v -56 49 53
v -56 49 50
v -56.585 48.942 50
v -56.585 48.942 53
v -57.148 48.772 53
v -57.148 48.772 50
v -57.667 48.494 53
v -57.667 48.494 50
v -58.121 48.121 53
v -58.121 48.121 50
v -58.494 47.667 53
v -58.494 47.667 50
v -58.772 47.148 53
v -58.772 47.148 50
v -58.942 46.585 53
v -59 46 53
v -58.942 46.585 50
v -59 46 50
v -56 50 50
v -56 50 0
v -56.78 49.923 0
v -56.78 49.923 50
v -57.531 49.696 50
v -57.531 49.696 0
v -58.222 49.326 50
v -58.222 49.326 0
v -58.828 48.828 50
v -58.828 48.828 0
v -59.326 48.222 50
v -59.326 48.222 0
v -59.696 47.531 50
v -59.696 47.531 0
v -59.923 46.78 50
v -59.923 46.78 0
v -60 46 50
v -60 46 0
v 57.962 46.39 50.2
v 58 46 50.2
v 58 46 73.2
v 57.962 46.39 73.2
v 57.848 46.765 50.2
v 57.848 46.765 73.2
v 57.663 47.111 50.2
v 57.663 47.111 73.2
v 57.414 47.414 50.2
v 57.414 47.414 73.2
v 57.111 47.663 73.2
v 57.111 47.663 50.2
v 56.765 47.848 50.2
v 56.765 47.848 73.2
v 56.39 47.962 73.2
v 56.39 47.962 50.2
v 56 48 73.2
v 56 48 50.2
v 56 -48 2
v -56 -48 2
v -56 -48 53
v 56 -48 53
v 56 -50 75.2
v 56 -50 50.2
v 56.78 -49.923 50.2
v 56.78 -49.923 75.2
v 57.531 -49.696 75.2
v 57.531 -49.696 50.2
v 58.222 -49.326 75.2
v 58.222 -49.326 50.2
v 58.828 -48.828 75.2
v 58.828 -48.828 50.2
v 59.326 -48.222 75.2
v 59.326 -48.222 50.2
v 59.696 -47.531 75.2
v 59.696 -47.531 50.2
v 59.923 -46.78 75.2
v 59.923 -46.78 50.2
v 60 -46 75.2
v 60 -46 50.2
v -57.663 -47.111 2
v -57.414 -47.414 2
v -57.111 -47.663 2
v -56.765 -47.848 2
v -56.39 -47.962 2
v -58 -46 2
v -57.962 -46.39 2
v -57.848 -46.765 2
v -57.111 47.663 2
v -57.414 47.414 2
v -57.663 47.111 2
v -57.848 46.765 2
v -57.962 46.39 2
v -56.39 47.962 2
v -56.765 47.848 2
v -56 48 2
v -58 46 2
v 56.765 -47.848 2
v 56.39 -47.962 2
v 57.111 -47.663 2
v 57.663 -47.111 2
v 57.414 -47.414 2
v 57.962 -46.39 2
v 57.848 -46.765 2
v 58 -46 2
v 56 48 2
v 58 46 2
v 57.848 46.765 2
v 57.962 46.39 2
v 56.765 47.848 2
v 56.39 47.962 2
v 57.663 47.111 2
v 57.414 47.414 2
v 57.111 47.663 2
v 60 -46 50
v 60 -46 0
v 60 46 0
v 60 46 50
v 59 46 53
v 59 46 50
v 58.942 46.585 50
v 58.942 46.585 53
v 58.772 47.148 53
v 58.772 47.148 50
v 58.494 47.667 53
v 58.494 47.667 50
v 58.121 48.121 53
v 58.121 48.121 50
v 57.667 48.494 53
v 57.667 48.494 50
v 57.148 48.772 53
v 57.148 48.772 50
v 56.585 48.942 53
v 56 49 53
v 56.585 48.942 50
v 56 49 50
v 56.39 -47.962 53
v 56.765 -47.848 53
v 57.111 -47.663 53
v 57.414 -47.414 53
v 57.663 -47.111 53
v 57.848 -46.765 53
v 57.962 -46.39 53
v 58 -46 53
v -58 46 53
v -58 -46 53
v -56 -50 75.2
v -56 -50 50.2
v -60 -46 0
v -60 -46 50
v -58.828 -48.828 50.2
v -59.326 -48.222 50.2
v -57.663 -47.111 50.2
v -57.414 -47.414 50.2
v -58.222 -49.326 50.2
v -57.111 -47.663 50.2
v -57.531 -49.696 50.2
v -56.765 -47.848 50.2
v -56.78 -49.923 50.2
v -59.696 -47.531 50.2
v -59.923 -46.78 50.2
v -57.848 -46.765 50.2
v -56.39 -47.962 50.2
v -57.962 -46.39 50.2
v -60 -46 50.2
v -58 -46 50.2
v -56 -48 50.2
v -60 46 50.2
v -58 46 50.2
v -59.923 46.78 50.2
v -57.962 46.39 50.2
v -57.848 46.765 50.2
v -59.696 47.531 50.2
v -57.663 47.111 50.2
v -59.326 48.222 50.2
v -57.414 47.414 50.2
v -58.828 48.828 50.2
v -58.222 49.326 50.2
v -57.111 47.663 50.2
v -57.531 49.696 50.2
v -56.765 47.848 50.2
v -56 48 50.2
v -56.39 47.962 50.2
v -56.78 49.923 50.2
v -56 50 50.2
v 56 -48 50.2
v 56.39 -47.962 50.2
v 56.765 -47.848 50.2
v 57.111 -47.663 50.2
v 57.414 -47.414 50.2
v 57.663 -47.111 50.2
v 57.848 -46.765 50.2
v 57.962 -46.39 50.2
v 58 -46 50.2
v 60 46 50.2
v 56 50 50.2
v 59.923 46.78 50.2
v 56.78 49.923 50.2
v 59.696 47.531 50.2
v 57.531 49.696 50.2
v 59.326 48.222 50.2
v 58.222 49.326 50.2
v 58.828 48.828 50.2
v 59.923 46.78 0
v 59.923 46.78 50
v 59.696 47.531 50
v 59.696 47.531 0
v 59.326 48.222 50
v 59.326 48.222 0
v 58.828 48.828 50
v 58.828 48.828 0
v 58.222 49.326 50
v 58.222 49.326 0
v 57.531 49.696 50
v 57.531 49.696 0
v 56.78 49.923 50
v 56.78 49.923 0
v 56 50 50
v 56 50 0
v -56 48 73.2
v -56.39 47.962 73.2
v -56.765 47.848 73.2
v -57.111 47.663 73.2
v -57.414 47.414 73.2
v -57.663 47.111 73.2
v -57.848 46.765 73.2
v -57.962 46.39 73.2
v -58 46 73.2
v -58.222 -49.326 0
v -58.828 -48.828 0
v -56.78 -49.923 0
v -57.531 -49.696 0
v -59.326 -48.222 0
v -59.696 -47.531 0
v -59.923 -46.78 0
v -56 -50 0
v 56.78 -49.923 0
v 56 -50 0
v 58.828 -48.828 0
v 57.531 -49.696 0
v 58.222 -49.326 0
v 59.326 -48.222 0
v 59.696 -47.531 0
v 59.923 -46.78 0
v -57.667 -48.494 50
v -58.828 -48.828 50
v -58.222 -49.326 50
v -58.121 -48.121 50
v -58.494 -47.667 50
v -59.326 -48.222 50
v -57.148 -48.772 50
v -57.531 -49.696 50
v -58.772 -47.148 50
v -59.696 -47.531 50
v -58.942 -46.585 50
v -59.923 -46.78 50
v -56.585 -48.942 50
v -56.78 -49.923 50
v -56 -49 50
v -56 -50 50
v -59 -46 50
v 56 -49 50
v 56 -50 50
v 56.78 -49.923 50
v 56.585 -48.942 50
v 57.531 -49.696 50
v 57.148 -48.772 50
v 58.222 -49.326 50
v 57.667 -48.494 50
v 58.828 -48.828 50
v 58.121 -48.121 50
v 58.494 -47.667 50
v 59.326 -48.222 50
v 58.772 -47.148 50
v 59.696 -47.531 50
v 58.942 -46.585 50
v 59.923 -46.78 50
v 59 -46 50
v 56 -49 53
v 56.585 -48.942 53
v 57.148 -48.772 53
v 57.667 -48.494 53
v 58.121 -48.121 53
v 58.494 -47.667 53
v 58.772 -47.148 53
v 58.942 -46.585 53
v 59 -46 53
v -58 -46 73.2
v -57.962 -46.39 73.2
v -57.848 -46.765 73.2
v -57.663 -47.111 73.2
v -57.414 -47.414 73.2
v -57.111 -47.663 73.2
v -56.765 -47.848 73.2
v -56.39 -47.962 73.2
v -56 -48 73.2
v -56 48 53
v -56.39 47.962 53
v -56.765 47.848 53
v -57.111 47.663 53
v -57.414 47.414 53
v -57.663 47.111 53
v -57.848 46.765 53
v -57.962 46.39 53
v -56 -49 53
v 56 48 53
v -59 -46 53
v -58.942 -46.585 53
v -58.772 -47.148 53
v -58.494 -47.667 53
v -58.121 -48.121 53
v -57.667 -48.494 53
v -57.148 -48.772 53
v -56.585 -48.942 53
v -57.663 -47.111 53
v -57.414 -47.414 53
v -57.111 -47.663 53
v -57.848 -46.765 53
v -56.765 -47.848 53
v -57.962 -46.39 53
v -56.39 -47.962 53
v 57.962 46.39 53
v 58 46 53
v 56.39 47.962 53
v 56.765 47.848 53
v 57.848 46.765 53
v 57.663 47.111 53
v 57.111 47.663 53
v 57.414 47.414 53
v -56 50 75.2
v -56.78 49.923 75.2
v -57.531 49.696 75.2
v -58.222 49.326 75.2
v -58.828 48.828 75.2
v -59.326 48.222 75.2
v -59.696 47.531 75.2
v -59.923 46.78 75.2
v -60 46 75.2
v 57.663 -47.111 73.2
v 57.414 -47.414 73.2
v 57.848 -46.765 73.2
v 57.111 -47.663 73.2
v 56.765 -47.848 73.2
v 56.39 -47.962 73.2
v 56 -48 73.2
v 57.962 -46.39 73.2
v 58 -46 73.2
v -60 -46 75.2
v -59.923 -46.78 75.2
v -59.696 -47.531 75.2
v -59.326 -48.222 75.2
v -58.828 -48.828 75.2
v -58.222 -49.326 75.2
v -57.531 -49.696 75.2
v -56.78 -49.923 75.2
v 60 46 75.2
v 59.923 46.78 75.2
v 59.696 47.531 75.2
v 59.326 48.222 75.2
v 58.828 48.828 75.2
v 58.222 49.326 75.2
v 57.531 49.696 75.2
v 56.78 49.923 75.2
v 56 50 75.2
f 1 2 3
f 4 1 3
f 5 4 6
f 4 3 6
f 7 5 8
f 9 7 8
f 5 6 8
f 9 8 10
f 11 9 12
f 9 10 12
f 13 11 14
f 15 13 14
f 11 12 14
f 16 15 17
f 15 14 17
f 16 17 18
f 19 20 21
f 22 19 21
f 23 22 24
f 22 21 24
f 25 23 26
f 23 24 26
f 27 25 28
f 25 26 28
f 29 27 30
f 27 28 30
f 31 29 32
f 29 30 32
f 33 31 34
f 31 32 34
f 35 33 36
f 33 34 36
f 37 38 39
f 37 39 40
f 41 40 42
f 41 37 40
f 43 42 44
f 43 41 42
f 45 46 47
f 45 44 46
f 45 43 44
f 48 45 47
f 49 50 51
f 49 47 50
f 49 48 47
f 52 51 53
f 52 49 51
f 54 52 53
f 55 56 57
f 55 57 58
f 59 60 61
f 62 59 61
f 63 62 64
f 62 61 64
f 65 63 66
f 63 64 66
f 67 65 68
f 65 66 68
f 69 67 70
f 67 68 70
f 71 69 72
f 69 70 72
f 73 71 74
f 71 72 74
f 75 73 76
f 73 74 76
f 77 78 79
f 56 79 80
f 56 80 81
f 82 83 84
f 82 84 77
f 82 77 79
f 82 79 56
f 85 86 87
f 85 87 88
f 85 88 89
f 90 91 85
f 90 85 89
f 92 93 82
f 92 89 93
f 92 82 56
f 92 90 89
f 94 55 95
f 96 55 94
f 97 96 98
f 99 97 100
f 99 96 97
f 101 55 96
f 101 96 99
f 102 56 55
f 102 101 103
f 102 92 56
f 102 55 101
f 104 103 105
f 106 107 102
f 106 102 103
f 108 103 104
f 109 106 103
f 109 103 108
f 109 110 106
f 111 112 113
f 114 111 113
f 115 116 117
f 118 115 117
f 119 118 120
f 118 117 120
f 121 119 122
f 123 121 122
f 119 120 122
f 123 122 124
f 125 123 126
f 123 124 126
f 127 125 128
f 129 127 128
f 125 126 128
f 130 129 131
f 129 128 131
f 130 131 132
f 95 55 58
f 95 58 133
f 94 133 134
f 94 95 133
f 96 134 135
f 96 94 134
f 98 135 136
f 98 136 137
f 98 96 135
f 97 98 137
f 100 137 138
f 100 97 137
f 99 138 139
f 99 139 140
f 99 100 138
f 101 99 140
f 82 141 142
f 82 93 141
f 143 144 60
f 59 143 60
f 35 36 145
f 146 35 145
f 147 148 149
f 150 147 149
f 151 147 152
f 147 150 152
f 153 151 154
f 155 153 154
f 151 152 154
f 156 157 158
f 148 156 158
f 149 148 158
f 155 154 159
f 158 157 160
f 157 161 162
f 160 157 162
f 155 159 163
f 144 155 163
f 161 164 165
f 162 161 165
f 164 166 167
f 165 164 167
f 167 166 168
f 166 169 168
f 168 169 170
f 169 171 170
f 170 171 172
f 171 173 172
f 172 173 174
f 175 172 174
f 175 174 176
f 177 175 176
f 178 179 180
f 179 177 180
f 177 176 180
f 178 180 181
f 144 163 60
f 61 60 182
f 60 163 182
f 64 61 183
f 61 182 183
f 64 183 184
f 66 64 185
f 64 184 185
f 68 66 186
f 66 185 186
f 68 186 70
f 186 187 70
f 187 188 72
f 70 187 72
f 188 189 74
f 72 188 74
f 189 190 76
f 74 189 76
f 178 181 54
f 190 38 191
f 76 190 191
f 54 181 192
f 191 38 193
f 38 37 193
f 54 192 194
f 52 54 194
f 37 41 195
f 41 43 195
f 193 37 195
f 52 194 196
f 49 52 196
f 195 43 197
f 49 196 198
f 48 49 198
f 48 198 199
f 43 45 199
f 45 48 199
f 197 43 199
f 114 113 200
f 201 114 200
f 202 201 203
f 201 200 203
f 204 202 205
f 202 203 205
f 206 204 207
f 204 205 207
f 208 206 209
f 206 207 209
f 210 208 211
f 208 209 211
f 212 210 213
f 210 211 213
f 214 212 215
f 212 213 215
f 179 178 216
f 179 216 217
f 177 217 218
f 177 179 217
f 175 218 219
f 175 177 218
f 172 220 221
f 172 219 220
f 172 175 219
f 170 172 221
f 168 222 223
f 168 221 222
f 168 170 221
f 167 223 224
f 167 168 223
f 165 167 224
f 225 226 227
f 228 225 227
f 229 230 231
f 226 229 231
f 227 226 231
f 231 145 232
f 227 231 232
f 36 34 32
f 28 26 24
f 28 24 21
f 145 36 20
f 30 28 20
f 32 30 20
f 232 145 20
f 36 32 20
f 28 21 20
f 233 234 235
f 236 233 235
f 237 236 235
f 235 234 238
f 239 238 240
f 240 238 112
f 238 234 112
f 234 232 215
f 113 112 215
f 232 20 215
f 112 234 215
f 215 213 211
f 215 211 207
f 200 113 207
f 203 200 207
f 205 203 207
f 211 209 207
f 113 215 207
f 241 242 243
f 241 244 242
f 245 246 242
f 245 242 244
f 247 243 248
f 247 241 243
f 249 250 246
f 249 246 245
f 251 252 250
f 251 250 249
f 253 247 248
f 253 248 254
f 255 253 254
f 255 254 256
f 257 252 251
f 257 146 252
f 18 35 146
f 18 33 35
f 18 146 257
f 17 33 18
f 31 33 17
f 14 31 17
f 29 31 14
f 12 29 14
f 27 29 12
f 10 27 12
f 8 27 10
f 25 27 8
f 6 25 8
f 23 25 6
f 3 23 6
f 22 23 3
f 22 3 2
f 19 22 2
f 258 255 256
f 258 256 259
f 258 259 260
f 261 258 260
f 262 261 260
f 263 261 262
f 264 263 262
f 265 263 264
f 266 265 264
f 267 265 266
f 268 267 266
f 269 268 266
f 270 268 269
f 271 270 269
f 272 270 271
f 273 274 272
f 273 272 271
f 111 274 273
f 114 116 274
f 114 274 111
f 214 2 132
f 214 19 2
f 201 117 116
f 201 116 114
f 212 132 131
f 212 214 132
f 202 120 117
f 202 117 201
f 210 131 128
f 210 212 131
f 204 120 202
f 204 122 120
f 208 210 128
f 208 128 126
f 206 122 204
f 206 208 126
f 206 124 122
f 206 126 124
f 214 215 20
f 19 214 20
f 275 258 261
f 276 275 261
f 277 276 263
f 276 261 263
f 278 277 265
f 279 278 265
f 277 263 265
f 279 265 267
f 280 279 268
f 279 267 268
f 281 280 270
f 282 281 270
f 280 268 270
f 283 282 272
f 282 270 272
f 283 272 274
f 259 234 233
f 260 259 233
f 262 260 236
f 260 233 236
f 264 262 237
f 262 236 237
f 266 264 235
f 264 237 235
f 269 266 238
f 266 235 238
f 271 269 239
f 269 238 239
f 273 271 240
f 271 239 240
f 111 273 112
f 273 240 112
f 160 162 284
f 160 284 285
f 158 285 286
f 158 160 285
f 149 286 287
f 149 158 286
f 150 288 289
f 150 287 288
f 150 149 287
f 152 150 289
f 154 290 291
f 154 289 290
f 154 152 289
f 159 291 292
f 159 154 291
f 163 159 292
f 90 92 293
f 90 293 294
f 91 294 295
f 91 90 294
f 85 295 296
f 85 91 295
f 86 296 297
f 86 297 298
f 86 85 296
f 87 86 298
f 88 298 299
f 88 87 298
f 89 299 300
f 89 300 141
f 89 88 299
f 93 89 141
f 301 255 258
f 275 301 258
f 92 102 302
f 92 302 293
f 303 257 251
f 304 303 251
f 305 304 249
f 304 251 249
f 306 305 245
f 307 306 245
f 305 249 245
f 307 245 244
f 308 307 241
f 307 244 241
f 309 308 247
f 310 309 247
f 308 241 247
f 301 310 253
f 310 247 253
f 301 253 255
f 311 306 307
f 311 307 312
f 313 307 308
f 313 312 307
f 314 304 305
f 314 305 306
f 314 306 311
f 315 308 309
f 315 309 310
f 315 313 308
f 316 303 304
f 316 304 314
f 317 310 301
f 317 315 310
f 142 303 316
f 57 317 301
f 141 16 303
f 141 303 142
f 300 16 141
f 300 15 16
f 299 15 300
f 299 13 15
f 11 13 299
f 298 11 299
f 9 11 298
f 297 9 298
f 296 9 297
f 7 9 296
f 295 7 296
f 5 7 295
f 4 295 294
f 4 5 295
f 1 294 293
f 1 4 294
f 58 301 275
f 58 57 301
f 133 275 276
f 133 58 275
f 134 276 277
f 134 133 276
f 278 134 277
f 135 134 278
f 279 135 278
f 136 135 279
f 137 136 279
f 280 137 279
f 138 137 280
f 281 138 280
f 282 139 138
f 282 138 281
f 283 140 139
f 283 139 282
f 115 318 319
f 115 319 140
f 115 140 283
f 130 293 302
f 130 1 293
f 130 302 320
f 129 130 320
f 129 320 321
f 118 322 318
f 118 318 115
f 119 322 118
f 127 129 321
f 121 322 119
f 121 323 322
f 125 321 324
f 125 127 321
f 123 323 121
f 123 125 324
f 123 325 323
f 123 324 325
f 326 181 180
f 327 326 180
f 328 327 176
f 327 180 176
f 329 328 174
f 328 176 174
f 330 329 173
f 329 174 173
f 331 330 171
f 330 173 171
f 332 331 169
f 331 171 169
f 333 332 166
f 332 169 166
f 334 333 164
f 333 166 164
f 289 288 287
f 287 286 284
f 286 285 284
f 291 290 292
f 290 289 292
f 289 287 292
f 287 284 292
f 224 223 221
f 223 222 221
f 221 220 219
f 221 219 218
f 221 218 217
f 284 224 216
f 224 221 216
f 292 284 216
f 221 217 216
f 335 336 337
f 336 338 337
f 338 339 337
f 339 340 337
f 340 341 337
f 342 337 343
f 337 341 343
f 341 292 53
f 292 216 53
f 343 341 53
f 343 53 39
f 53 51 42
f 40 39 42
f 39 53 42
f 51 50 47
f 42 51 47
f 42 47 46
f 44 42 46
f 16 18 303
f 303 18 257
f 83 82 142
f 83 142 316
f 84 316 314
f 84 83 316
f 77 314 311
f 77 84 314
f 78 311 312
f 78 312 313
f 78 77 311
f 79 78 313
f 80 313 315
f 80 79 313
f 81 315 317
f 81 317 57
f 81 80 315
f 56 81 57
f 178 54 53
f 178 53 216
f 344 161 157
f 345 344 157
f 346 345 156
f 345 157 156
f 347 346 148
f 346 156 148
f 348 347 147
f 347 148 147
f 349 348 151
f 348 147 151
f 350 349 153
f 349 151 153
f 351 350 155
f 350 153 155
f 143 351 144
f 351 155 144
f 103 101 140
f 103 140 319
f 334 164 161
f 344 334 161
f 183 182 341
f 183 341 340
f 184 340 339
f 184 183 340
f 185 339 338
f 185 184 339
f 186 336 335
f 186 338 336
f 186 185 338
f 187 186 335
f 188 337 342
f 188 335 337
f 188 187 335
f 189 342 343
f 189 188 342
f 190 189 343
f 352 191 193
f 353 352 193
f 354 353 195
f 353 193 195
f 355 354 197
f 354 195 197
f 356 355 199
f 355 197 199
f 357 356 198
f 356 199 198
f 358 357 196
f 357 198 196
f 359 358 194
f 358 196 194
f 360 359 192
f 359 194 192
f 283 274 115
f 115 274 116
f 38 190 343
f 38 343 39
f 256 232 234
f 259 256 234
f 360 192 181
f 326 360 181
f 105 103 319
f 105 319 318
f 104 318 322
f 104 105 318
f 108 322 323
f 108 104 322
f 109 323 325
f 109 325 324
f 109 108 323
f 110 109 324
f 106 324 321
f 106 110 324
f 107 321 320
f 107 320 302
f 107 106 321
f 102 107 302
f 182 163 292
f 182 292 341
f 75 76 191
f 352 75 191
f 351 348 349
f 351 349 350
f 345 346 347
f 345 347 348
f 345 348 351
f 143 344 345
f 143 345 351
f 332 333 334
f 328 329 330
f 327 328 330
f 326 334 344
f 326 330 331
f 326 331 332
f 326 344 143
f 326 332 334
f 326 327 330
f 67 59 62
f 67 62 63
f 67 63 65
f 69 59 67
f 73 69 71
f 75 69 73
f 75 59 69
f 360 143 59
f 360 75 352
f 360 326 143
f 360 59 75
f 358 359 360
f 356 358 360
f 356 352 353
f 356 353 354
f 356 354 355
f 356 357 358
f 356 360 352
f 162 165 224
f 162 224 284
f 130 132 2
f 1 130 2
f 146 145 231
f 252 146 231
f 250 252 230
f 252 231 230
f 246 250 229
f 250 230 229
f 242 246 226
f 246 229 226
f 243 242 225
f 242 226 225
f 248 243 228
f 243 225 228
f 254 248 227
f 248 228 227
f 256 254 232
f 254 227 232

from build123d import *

# Parameters (mm, degrees)
PAD_DEPTH       = 50
PAD001_DEPTH    = 3
POCKET_DEPTH    = 48
PAD002_DEPTH    = 25
THICKNESS_T     = -2
POCKET001_DEPTH = 3


with BuildPart() as base:
    # Sketch → Pad (new body)
    with BuildSketch(Plane.XY):
        with BuildLine():
            Line((-60, 46), (-60, -46))
            ThreePointArc((-60, -46), (-58.828427, -48.828427), (-56, -50))
            Line((-56, -50), (56, -50))
            ThreePointArc((56, -50), (58.828427, -48.828427), (60, -46))
            Line((60, -46), (60, 46))
            ThreePointArc((60, 46), (58.828427, 48.828427), (56, 50))
            Line((56, 50), (-56, 50))
            ThreePointArc((-56, 50), (-58.828427, 48.828427), (-60, 46))
        make_face()
    extrude(amount=PAD_DEPTH)

    # Sketch001 → Pad001 (join)
    with BuildSketch(Plane.XY.offset(50)):
        with BuildLine():
            Line((-59, 46), (-59, -46))
            ThreePointArc((-59, -46), (-58.12132, -48.12132), (-56, -49))
            Line((-56, -49), (56, -49))
            ThreePointArc((56, -49), (58.12132, -48.12132), (59, -46))
            Line((59, -46), (59, 46))
            ThreePointArc((59, 46), (58.12132, 48.12132), (56, 49))
            Line((56, 49), (-56, 49))
            ThreePointArc((-56, 49), (-58.12132, 48.12132), (-59, 46))
        make_face()
        with BuildLine():
            Line((-58, 46), (-58, -46))
            ThreePointArc((-58, -46), (-57.414214, -47.414214), (-56, -48))
            Line((-56, -48), (56, -48))
            ThreePointArc((56, -48), (57.414214, -47.414214), (58, -46))
            Line((58, -46), (58, 46))
            ThreePointArc((58, 46), (57.414214, 47.414214), (56, 48))
            Line((56, 48), (-56, 48))
            ThreePointArc((-56, 48), (-57.414214, 47.414214), (-58, 46))
        make_face(mode=Mode.SUBTRACT)
    extrude(amount=PAD001_DEPTH)

    # Sketch003 (on Face28 of Pad001) → Pocket (cut)
    with BuildSketch(Plane.XY.offset(50)):
        with BuildLine():
            Line((-58, 46), (-58, -46))
            ThreePointArc((-58, -46), (-57.414214, -47.414214), (-56, -48))
            Line((-56, -48), (56, -48))
            ThreePointArc((56, -48), (57.414214, -47.414214), (58, -46))
            Line((58, -46), (58, 46))
            ThreePointArc((58, 46), (57.414214, 47.414214), (56, 48))
            Line((56, 48), (-56, 48))
            ThreePointArc((-56, 48), (-57.414214, 47.414214), (-58, 46))
        make_face()
    extrude(amount=-POCKET_DEPTH, mode=Mode.SUBTRACT)


with BuildPart() as lid:
    # Sketch004 → Pad002 (new body)
    with BuildSketch(Plane.XY.offset(50.2)):
        with BuildLine():
            Line((-60, 46), (-60, -46))
            ThreePointArc((-60, -46), (-58.828427, -48.828427), (-56, -50))
            Line((-56, -50), (56, -50))
            ThreePointArc((56, -50), (58.828427, -48.828427), (60, -46))
            Line((60, -46), (60, 46))
            ThreePointArc((60, 46), (58.828427, 48.828427), (56, 50))
            Line((56, 50), (-56, 50))
            ThreePointArc((-56, 50), (-58.828427, 48.828427), (-60, 46))
        make_face()
    extrude(amount=PAD002_DEPTH)

    # Thickness
    thickness_openings = [lid.faces().sort_by_distance(p)[0] for p in [
        (0, 0, 50.2),
    ]]
    offset(amount=THICKNESS_T, openings=thickness_openings)

    # Sketch005 (on Face10 of Thickness) → Pocket001 (cut)
    with BuildSketch(Plane(origin=(0, 0, 50.2), x_dir=(1, 0, 0), z_dir=(0, 0, -1))):
        with BuildLine():
            Line((-19.1, 25.9), (-19.1, -25.9))
            ThreePointArc((-19.1, -25.9), (-18.162742, -28.162742), (-15.9, -29.1))
            Line((-15.9, -29.1), (15.9, -29.1))
            ThreePointArc((15.9, -29.1), (18.162742, -28.162742), (19.1, -25.9))
            Line((19.1, -25.9), (19.1, 25.9))
            ThreePointArc((19.1, 25.9), (18.162742, 28.162742), (15.9, 29.1))
            Line((15.9, 29.1), (-15.9, 29.1))
            ThreePointArc((-15.9, 29.1), (-18.162742, 28.162742), (-19.1, 25.9))
        make_face()
    extrude(amount=-POCKET001_DEPTH, mode=Mode.SUBTRACT)


solid = Compound([base.part, lid.part])
